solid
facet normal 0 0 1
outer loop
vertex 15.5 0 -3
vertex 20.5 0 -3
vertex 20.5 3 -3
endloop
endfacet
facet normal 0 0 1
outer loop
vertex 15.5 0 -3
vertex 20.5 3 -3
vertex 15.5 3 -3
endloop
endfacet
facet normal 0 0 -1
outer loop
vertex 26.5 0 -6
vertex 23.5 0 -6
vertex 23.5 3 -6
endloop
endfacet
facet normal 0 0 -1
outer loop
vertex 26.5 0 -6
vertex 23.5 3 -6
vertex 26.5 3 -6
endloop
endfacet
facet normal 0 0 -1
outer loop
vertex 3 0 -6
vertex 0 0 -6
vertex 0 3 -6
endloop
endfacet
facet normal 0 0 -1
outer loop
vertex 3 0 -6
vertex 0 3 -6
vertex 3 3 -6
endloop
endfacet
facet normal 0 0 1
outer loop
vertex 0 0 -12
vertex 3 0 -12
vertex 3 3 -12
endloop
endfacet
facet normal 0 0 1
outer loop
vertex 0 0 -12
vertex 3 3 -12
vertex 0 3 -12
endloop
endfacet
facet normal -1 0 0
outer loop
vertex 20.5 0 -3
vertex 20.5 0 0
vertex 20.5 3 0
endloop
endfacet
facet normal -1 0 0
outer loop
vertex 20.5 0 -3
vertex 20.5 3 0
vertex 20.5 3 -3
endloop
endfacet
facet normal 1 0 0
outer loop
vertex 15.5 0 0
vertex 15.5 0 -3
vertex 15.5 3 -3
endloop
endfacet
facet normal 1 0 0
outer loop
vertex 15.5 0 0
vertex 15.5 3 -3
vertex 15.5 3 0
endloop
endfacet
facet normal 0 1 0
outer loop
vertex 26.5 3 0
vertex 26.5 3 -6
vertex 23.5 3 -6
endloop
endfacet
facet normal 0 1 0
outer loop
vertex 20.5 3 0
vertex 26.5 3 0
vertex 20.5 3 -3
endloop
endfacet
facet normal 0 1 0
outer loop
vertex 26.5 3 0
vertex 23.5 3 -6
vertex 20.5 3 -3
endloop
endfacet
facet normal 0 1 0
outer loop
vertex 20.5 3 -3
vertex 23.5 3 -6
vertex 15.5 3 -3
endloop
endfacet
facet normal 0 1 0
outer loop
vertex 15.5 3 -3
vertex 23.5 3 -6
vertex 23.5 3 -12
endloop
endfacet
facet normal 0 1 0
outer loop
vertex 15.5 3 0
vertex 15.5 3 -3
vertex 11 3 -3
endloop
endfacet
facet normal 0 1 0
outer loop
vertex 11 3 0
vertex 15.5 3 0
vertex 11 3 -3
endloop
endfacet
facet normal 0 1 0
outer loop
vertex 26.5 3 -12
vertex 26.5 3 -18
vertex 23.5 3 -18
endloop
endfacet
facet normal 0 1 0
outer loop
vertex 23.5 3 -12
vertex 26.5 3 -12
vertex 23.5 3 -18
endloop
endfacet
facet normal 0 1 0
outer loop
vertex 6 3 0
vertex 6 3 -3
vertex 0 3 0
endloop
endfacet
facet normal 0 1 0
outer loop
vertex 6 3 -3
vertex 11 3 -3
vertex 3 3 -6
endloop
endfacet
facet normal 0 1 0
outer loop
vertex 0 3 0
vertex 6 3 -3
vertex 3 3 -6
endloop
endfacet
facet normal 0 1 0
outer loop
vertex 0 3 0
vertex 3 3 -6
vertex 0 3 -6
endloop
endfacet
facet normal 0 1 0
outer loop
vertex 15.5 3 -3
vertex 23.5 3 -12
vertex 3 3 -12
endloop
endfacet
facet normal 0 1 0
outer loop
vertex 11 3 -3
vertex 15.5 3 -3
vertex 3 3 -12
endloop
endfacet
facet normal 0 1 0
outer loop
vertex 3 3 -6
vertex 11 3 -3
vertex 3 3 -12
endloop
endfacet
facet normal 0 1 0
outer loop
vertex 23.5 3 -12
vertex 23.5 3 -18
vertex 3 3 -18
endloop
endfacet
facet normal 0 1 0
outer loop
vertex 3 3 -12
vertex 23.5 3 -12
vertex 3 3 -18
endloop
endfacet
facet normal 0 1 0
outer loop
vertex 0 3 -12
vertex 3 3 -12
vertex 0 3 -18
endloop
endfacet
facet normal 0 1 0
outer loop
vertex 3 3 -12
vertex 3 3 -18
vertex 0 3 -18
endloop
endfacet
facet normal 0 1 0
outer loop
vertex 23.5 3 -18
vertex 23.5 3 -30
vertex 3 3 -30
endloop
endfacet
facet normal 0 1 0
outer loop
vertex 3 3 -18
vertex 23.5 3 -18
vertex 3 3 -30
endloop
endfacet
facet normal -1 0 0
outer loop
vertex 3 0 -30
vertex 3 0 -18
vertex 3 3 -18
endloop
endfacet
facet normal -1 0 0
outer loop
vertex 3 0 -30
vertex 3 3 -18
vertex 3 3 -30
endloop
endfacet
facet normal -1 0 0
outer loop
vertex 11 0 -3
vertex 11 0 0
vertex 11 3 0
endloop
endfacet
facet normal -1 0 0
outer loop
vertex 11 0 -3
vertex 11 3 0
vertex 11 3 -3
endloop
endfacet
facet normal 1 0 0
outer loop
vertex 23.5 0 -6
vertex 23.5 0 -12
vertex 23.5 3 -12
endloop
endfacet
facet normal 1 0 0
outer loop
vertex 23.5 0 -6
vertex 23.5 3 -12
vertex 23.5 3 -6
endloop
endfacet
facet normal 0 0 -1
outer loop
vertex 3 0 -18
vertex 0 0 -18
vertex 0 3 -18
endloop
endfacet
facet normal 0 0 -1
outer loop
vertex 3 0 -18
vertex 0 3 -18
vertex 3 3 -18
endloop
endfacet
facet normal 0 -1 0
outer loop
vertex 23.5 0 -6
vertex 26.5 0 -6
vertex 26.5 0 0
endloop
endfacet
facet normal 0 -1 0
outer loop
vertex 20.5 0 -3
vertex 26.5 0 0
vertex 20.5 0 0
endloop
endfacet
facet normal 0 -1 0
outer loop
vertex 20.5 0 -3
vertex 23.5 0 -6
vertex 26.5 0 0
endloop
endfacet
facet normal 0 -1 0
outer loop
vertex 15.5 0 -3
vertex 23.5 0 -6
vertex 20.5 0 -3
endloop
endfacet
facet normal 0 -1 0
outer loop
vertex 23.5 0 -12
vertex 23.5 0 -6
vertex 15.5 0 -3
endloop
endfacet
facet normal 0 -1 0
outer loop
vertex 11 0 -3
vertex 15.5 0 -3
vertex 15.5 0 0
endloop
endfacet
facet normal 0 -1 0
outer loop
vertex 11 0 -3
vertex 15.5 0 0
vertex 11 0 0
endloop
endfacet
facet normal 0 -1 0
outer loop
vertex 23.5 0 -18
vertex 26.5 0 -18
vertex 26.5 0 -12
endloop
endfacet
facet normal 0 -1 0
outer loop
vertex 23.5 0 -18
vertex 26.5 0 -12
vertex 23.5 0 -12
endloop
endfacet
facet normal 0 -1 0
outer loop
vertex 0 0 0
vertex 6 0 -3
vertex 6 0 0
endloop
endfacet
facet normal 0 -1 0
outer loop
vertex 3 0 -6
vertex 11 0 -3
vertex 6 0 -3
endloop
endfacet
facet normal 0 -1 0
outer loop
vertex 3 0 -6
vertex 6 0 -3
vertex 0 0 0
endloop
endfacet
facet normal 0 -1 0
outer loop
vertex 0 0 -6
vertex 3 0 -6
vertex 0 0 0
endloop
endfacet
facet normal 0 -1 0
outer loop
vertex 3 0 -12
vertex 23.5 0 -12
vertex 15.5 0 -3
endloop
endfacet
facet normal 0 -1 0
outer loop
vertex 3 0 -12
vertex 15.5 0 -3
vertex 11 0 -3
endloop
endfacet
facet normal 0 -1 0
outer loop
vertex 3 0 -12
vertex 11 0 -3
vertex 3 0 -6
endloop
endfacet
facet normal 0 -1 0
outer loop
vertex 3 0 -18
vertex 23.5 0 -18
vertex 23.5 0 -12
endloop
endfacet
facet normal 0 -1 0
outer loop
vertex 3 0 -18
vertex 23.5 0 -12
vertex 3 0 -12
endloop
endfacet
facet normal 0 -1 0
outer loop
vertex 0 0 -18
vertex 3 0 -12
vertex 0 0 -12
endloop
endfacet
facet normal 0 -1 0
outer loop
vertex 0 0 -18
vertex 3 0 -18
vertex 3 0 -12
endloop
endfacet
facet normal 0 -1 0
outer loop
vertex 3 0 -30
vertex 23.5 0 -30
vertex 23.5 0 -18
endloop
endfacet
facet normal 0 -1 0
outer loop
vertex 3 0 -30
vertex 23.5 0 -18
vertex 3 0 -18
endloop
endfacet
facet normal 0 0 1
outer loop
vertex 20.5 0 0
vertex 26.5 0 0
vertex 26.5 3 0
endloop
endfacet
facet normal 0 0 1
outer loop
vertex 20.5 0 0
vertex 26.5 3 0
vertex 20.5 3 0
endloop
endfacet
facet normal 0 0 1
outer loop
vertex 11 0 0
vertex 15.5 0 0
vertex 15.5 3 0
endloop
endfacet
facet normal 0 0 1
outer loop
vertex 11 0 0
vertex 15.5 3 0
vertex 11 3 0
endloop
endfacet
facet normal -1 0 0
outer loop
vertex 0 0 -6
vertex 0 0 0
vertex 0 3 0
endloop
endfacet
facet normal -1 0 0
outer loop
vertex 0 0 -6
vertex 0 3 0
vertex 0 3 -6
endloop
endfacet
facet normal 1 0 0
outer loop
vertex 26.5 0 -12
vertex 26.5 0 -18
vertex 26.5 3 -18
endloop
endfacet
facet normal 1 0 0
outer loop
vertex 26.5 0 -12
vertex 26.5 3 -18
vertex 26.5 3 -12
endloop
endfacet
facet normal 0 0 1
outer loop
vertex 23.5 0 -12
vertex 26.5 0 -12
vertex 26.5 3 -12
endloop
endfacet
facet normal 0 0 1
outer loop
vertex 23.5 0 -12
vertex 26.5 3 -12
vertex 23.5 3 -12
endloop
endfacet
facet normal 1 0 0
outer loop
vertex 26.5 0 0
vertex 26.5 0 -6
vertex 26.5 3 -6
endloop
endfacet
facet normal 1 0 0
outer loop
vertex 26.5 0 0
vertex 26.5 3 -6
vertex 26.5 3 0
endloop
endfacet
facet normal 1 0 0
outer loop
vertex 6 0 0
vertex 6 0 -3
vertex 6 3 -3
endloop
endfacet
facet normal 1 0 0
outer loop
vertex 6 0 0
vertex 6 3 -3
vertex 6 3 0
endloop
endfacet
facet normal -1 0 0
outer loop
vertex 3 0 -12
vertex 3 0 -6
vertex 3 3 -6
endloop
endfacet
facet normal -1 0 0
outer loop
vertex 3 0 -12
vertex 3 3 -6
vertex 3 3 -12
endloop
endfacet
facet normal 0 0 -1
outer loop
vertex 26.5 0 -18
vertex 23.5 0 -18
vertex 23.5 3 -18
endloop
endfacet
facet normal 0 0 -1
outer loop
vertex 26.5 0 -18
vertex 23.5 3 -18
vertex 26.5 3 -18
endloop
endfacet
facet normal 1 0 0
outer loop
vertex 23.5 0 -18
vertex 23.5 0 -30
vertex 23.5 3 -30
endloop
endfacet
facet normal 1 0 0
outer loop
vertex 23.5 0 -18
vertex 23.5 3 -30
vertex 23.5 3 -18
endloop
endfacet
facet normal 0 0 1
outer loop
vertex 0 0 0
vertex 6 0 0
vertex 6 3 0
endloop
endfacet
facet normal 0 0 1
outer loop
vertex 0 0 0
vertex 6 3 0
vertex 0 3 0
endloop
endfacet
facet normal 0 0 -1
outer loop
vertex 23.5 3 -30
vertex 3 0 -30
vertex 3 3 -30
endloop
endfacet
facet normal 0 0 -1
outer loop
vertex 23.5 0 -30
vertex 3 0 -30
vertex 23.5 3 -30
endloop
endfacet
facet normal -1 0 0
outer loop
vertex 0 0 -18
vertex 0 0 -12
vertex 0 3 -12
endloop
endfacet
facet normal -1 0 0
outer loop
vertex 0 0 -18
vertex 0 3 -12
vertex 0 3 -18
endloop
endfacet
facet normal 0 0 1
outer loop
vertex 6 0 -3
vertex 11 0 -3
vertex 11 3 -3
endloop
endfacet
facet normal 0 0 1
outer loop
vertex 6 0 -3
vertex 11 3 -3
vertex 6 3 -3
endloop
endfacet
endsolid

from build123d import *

# Parameters (mm, degrees)
PAREDELADO2_DEPTH = 3


with BuildPart() as part:
    # ParedeLado2Esboco → ParedeLado2 (new body)
    with BuildSketch(Plane(origin=(0, 0, 0), x_dir=(1, 0, 0), z_dir=(0, 1, 0))):
        Polygon((0, 0), (0, 6), (3, 6), (3, 12), (0, 12), (0, 18), (3, 18), (3, 30), (23.5, 30), (23.5, 18), (26.5, 18), (26.5, 12), (23.5, 12), (23.5, 6), (26.5, 6), (26.5, 0), (20.5, 0), (20.5, 3), (15.5, 3), (15.5, 0), (11, 0), (11, 3), (6, 3), (6, 0), align=None)
    extrude(amount=PAREDELADO2_DEPTH)


solid = part.part
